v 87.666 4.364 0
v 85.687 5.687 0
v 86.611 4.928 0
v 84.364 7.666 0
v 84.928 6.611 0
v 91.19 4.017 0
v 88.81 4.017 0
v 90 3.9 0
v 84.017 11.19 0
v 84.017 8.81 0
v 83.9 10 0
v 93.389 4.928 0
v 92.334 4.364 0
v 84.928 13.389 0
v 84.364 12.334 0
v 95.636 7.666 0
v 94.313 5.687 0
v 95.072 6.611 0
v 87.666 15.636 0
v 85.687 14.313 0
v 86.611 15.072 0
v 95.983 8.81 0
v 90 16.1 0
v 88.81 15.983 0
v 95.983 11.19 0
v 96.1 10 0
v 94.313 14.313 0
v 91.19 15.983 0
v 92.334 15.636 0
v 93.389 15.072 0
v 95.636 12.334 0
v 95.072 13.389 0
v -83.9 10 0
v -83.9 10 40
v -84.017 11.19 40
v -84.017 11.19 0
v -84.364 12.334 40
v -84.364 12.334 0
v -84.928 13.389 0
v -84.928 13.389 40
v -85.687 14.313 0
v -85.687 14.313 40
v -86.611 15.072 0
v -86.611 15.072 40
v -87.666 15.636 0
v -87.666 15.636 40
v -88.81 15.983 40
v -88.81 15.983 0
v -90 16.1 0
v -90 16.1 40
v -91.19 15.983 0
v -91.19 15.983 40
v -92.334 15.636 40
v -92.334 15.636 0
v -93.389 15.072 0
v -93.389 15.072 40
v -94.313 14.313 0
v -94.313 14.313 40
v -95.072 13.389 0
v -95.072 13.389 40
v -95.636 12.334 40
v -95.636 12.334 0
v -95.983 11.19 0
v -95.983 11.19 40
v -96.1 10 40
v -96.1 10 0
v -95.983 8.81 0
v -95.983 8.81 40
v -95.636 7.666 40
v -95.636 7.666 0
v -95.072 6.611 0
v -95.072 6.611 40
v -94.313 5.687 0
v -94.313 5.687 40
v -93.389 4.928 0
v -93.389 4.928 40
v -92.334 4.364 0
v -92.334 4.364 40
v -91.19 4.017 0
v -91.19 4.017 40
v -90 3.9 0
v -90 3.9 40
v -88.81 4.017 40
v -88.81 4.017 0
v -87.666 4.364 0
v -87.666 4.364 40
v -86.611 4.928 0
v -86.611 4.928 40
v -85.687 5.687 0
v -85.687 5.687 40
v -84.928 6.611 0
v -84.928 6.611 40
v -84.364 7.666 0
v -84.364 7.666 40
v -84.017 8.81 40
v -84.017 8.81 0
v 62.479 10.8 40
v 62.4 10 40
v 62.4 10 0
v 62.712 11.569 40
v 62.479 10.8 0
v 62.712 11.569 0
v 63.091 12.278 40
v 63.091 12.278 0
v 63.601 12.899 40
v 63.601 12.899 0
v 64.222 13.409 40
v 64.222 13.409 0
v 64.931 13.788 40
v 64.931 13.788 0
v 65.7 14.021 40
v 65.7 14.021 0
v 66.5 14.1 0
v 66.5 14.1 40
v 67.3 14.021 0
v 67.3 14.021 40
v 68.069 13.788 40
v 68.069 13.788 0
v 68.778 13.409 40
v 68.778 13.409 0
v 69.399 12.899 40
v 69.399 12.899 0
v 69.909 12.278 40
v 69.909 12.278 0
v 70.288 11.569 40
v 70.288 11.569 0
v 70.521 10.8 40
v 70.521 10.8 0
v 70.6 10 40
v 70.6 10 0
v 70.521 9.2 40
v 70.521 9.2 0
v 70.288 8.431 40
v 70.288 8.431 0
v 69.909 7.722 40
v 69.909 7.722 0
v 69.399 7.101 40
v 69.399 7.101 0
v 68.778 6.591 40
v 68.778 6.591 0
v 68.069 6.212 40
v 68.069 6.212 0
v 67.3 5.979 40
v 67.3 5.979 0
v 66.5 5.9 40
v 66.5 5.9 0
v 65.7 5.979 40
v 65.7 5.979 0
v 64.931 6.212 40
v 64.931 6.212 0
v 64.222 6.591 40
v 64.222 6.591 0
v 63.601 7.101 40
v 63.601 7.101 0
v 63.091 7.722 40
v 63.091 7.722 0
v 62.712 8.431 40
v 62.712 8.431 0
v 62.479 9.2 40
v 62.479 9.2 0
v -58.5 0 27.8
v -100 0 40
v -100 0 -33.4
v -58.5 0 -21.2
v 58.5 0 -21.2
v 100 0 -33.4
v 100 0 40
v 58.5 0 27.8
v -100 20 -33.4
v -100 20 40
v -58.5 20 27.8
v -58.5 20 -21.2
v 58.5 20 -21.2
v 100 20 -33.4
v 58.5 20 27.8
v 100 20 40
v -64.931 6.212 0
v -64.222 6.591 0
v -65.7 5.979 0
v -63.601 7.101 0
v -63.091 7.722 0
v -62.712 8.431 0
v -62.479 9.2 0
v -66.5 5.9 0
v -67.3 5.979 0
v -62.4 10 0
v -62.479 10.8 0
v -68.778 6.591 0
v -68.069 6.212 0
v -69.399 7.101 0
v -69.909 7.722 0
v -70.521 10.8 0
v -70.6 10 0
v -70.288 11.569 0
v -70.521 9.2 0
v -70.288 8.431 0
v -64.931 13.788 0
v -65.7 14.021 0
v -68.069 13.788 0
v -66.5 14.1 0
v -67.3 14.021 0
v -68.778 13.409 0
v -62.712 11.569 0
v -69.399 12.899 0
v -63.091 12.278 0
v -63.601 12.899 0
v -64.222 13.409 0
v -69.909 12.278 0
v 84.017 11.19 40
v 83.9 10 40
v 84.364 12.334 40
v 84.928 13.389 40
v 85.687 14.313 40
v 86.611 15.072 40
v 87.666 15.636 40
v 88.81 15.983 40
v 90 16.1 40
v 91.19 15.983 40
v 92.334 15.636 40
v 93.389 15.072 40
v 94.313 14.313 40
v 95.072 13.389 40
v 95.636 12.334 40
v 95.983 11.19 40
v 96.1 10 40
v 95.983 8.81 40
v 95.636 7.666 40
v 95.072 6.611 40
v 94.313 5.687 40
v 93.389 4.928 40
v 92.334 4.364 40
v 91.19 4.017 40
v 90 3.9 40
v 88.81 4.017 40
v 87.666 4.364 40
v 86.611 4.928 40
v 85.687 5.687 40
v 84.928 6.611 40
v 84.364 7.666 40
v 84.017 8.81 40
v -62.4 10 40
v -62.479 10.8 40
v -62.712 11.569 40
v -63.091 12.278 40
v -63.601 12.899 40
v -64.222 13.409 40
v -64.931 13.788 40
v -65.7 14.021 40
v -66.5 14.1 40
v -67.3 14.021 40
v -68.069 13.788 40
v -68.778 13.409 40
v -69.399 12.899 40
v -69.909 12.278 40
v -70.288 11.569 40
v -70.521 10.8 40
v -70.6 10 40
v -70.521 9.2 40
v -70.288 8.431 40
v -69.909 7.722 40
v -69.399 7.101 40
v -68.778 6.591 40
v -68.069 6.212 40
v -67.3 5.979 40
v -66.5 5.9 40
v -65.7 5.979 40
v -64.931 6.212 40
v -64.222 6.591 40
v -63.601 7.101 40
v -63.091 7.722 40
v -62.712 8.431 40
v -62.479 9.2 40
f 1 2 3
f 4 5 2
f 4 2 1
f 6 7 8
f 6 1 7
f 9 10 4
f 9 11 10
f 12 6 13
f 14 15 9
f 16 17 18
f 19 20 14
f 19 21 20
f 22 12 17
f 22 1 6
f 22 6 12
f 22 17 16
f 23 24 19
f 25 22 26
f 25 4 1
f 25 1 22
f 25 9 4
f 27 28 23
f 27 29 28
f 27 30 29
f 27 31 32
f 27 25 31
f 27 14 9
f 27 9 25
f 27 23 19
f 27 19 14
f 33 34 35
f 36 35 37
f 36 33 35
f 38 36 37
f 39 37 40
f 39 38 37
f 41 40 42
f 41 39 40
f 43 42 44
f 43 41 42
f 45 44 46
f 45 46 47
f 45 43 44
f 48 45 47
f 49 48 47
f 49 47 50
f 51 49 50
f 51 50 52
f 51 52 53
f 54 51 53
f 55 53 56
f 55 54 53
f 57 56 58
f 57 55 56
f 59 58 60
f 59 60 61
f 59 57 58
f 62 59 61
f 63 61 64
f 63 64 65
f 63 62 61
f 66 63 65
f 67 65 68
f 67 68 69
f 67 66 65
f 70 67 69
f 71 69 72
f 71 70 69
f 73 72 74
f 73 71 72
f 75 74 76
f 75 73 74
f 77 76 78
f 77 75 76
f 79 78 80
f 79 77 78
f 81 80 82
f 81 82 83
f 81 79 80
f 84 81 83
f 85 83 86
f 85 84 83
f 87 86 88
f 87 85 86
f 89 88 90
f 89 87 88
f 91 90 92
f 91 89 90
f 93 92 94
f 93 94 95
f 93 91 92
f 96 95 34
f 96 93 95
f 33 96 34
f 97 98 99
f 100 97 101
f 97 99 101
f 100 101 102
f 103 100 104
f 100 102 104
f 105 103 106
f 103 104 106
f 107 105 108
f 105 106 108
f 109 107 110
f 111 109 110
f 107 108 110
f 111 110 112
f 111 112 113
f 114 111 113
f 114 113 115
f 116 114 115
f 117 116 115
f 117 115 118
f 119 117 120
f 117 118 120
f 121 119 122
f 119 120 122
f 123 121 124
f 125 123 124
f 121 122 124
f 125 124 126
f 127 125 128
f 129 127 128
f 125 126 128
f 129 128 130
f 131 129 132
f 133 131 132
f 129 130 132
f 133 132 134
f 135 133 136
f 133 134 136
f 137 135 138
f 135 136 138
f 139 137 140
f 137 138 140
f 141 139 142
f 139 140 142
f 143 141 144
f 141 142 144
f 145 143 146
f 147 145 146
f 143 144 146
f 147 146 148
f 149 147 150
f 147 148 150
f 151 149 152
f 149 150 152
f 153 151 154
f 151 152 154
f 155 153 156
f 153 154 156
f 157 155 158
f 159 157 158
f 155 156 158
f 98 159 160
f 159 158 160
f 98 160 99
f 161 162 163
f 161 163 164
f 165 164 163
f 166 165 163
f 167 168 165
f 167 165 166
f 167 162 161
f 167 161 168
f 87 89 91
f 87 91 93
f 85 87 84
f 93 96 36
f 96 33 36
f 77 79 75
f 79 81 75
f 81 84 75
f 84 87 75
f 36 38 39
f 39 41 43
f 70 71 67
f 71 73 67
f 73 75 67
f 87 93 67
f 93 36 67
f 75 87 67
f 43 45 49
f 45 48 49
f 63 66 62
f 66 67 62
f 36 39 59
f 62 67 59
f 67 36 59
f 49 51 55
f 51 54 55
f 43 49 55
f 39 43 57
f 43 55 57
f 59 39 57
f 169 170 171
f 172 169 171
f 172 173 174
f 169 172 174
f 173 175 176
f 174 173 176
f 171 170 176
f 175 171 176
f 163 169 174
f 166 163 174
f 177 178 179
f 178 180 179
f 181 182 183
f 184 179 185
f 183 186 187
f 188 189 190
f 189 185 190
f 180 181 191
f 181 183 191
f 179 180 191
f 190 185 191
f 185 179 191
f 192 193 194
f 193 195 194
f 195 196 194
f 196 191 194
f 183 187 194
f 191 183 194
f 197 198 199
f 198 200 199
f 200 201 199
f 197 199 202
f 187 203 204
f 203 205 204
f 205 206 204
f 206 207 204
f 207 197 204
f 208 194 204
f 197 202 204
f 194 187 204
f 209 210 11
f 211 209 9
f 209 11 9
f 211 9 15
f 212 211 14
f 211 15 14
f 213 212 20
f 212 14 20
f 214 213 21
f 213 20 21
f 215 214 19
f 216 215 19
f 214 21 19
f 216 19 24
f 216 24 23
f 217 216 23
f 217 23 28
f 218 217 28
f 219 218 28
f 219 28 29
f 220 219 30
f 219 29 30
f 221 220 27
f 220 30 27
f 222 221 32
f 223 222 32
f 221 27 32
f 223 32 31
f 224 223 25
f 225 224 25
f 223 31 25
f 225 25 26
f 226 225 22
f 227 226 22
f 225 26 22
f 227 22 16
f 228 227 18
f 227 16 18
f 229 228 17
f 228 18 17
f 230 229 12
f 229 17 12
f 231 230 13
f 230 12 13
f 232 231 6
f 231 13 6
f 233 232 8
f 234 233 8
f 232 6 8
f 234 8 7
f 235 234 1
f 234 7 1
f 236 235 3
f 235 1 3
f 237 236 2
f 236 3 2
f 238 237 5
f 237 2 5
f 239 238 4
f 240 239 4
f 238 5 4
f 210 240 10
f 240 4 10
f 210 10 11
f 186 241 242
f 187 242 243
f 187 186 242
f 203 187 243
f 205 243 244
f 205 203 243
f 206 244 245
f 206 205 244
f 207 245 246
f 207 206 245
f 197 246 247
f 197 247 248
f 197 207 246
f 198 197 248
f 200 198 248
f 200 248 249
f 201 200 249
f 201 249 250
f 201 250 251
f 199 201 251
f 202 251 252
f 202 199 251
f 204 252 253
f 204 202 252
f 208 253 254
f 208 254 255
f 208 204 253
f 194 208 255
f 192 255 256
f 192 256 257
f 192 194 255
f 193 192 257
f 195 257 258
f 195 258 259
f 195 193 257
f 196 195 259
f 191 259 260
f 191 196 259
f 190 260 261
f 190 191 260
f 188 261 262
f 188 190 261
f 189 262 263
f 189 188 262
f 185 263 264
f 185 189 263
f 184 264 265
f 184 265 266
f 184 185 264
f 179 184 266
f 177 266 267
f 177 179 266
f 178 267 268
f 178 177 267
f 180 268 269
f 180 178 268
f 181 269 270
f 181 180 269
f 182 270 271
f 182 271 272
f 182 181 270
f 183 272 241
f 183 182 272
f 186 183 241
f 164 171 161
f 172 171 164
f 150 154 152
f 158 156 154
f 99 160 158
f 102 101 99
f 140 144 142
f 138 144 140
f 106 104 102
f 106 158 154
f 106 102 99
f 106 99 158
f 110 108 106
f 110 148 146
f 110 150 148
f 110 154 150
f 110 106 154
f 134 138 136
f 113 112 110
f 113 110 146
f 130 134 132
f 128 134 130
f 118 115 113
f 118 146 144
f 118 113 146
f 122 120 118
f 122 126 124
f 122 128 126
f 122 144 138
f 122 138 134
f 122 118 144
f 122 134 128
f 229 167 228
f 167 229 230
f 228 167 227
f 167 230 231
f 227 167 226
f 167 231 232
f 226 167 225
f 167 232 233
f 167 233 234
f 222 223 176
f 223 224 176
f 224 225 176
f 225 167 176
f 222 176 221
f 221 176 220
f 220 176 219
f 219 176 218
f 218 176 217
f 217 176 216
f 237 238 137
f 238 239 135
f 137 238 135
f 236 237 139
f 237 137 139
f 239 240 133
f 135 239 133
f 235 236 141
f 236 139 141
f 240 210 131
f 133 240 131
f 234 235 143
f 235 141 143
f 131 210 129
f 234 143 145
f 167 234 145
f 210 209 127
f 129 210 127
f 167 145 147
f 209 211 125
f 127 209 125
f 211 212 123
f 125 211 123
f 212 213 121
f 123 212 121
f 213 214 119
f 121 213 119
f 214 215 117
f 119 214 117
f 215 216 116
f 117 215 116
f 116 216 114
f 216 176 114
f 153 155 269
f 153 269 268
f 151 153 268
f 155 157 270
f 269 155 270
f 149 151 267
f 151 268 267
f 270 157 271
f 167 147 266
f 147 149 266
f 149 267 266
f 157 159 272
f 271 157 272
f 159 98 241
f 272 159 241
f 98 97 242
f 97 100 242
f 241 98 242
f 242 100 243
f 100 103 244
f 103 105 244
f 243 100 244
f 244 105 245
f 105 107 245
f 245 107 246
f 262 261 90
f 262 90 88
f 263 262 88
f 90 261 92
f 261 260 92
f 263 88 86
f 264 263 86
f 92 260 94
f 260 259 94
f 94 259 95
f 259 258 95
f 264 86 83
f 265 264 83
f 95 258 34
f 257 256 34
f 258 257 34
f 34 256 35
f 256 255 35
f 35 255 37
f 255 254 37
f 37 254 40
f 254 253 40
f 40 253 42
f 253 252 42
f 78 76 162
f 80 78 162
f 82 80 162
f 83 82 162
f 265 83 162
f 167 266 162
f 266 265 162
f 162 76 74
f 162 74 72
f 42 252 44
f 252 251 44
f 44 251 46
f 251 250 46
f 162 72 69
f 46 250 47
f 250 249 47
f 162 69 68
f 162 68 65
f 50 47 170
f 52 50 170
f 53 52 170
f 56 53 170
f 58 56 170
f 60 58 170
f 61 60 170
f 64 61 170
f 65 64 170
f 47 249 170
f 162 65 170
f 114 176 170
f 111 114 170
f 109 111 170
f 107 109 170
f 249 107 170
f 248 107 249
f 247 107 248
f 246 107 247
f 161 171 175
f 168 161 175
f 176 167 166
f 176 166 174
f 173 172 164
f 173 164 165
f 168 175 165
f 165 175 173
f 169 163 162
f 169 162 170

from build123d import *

# Parameters (mm, degrees)
SKETCH1_W           = 100
SKETCH1_H           = 20
SKETCH1_R           = 6.1
SKETCH1_R_2         = 4.1
BOSS_EXTRUDE1_DEPTH = 40
SKETCH2_W           = 100
SKETCH2_H           = 20
BOSS_EXTRUDE2_DEPTH = 33.4
CUT_EXTRUDE1_REACH  = 111.545
SKETCH3_W           = 58.5
SKETCH3_H           = 49


with BuildPart() as part:
    # Sketch1 → Boss-Extrude1 (new body)
    with BuildSketch(Plane.XY):
        with Locations((-50, 10)):
            Rectangle(SKETCH1_W, SKETCH1_H)
        with Locations((-90, 10)):
            Circle(SKETCH1_R, mode=Mode.SUBTRACT)
        with Locations((-66.5, 10)):
            Circle(SKETCH1_R_2, mode=Mode.SUBTRACT)
    boss_extrude1 = extrude(amount=BOSS_EXTRUDE1_DEPTH)

    # Sketch2 → Boss-Extrude2 (add)
    with BuildSketch(Plane(origin=(0, 0, 0), x_dir=(-1, 0, 0), z_dir=(0, 0, -1))):
        with Locations((50, 10)):
            Rectangle(SKETCH2_W, SKETCH2_H)
    boss_extrude2 = extrude(amount=BOSS_EXTRUDE2_DEPTH)

    # Sketch3 → Cut-Extrude1 (cut, up to next)
    with BuildSketch(Plane(origin=(0, 20, 0), x_dir=(1, 0, 0), z_dir=(0, 1, 0)), mode=Mode.PRIVATE) as cut_extrude1_sk1:
        with Locations((-29.25, -3.3)):
            Rectangle(SKETCH3_W, SKETCH3_H)
    cut_extrude1_tool1 = extrude(cut_extrude1_sk1.sketch, amount=-CUT_EXTRUDE1_REACH, mode=Mode.PRIVATE) & part.part
    cut_extrude1 = cut_extrude1_tool1.solids().sort_by_distance((-29.25, 20, 3.3))[0]
    add(cut_extrude1, mode=Mode.SUBTRACT)

    # Mirror2: Boss-Extrude1, Boss-Extrude2, Cut-Extrude1 across plane
    add(boss_extrude1.mirror(Plane(origin=(0, 0, 40), x_dir=(0, 0, 1), z_dir=(-1, 0, 0))))
    add(boss_extrude2.mirror(Plane(origin=(0, 0, 40), x_dir=(0, 0, 1), z_dir=(-1, 0, 0))))
    add(cut_extrude1.mirror(Plane(origin=(0, 0, 40), x_dir=(0, 0, 1), z_dir=(-1, 0, 0))), mode=Mode.SUBTRACT)


solid = part.part
